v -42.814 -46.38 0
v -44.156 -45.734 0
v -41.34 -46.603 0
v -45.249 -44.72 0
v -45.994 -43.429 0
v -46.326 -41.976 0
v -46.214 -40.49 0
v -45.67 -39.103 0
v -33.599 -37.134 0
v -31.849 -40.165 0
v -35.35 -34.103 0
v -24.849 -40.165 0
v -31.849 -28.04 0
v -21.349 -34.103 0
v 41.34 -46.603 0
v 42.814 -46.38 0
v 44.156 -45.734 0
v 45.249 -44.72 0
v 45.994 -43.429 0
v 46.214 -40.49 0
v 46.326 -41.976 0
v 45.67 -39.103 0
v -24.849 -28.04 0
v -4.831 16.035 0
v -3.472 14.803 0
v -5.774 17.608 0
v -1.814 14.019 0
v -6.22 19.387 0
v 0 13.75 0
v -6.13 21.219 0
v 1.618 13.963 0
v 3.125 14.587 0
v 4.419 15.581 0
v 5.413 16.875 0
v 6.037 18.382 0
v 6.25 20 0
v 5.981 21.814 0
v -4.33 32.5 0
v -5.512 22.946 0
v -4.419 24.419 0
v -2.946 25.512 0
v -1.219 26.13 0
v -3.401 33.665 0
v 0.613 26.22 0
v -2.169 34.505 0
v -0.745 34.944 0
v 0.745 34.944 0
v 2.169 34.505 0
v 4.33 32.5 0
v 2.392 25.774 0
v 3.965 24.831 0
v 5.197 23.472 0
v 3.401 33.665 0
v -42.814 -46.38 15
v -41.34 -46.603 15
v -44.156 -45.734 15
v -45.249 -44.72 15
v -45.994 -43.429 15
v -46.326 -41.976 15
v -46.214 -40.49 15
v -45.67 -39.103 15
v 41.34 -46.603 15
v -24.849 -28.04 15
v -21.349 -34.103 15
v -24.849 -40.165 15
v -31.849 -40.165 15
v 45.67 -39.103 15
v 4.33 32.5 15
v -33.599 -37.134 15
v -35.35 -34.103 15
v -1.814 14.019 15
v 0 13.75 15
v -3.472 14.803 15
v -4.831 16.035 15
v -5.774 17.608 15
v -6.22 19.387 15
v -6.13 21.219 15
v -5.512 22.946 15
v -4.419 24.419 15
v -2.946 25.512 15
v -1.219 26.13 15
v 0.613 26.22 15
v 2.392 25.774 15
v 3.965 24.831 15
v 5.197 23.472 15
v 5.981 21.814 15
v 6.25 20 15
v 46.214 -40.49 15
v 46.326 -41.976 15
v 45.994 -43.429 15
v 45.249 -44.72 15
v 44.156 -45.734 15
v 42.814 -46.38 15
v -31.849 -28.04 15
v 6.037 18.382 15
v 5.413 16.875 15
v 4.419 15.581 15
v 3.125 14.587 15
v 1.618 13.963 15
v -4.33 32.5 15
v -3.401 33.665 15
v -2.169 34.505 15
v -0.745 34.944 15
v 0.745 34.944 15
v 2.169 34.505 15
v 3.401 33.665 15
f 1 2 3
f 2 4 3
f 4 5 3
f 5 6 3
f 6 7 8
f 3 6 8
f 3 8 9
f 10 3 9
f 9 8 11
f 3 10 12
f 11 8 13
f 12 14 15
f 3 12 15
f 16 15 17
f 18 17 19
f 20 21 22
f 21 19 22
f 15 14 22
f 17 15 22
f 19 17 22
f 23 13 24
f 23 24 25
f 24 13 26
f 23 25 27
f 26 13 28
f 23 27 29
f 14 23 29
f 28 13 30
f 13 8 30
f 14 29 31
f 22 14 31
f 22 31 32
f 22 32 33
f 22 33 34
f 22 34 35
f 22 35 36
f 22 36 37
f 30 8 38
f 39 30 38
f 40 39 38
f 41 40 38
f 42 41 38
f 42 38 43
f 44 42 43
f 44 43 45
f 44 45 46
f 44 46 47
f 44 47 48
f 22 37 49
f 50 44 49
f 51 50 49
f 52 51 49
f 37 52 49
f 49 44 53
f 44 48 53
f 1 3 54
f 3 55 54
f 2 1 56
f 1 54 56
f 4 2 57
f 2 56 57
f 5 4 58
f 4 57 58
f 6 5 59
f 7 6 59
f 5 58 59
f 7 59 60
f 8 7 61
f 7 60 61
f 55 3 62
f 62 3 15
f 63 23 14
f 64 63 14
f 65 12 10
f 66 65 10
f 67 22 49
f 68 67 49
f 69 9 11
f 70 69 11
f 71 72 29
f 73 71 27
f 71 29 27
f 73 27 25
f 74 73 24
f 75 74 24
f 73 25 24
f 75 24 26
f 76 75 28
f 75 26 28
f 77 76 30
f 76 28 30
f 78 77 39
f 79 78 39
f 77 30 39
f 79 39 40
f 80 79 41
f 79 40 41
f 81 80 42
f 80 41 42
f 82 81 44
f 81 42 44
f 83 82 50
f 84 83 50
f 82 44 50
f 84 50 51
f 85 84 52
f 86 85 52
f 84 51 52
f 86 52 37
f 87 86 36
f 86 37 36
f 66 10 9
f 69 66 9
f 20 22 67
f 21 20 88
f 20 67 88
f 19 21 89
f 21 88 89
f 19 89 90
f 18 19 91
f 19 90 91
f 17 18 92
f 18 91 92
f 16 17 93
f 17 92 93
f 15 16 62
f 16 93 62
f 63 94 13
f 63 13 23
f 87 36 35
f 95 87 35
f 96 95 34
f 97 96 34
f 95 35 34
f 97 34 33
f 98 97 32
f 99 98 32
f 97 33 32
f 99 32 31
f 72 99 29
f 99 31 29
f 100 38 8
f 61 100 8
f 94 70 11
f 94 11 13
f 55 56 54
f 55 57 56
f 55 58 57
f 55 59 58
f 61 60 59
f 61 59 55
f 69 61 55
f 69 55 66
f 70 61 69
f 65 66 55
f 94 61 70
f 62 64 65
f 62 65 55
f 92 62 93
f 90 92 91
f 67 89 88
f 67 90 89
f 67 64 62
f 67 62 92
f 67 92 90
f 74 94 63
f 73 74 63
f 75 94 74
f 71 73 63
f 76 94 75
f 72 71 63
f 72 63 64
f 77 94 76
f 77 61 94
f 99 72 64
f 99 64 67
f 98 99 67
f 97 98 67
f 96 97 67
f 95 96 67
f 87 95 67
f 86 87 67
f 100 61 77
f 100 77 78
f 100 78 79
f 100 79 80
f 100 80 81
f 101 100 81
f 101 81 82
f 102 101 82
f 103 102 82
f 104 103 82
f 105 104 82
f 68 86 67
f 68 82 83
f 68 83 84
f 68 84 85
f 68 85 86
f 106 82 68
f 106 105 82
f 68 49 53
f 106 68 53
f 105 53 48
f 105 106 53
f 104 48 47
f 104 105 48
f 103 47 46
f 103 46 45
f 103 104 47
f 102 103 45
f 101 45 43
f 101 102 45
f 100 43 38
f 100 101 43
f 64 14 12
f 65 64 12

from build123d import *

# Parameters (mm, degrees)
F1_DEPTH = 15
F2_R     = 5


with BuildPart() as f1:
    # F0 (on Top) → F1 (new body)
    with BuildSketch(Plane.XY):
        Polygon((50, -46.6025403784), (0, 40), (-50, -46.6025403784), align=None)
        Polygon((-31.8494454538, -40.1648577189), (-33.599485728, -37.1336990487), (-35.3495260022, -34.1025403784), (-31.8494454538, -28.040223038), (-24.849284357, -28.040223038), (-21.3492038085, -34.1025403784), (-24.849284357, -40.1648577189), align=None, mode=Mode.SUBTRACT)
        with BuildLine():
            ThreePointArc((0, 13.75), (-4.4194173824, 24.4194173824), (6.25, 20))
            ThreePointArc((6.25, 20), (4.4194173824, 15.5805826176), (0, 13.75))
        make_face(mode=Mode.SUBTRACT)
    extrude(amount=F1_DEPTH)

    # F2
    f2_edges = [f1.edges().sort_by_distance(p)[0] for p in [
        (-50, -46.60254, 7.5),
        (50, -46.60254, 7.5),
        (0, 40, 7.5),
    ]]
    fillet(f2_edges, radius=F2_R)


solid = f1.part
